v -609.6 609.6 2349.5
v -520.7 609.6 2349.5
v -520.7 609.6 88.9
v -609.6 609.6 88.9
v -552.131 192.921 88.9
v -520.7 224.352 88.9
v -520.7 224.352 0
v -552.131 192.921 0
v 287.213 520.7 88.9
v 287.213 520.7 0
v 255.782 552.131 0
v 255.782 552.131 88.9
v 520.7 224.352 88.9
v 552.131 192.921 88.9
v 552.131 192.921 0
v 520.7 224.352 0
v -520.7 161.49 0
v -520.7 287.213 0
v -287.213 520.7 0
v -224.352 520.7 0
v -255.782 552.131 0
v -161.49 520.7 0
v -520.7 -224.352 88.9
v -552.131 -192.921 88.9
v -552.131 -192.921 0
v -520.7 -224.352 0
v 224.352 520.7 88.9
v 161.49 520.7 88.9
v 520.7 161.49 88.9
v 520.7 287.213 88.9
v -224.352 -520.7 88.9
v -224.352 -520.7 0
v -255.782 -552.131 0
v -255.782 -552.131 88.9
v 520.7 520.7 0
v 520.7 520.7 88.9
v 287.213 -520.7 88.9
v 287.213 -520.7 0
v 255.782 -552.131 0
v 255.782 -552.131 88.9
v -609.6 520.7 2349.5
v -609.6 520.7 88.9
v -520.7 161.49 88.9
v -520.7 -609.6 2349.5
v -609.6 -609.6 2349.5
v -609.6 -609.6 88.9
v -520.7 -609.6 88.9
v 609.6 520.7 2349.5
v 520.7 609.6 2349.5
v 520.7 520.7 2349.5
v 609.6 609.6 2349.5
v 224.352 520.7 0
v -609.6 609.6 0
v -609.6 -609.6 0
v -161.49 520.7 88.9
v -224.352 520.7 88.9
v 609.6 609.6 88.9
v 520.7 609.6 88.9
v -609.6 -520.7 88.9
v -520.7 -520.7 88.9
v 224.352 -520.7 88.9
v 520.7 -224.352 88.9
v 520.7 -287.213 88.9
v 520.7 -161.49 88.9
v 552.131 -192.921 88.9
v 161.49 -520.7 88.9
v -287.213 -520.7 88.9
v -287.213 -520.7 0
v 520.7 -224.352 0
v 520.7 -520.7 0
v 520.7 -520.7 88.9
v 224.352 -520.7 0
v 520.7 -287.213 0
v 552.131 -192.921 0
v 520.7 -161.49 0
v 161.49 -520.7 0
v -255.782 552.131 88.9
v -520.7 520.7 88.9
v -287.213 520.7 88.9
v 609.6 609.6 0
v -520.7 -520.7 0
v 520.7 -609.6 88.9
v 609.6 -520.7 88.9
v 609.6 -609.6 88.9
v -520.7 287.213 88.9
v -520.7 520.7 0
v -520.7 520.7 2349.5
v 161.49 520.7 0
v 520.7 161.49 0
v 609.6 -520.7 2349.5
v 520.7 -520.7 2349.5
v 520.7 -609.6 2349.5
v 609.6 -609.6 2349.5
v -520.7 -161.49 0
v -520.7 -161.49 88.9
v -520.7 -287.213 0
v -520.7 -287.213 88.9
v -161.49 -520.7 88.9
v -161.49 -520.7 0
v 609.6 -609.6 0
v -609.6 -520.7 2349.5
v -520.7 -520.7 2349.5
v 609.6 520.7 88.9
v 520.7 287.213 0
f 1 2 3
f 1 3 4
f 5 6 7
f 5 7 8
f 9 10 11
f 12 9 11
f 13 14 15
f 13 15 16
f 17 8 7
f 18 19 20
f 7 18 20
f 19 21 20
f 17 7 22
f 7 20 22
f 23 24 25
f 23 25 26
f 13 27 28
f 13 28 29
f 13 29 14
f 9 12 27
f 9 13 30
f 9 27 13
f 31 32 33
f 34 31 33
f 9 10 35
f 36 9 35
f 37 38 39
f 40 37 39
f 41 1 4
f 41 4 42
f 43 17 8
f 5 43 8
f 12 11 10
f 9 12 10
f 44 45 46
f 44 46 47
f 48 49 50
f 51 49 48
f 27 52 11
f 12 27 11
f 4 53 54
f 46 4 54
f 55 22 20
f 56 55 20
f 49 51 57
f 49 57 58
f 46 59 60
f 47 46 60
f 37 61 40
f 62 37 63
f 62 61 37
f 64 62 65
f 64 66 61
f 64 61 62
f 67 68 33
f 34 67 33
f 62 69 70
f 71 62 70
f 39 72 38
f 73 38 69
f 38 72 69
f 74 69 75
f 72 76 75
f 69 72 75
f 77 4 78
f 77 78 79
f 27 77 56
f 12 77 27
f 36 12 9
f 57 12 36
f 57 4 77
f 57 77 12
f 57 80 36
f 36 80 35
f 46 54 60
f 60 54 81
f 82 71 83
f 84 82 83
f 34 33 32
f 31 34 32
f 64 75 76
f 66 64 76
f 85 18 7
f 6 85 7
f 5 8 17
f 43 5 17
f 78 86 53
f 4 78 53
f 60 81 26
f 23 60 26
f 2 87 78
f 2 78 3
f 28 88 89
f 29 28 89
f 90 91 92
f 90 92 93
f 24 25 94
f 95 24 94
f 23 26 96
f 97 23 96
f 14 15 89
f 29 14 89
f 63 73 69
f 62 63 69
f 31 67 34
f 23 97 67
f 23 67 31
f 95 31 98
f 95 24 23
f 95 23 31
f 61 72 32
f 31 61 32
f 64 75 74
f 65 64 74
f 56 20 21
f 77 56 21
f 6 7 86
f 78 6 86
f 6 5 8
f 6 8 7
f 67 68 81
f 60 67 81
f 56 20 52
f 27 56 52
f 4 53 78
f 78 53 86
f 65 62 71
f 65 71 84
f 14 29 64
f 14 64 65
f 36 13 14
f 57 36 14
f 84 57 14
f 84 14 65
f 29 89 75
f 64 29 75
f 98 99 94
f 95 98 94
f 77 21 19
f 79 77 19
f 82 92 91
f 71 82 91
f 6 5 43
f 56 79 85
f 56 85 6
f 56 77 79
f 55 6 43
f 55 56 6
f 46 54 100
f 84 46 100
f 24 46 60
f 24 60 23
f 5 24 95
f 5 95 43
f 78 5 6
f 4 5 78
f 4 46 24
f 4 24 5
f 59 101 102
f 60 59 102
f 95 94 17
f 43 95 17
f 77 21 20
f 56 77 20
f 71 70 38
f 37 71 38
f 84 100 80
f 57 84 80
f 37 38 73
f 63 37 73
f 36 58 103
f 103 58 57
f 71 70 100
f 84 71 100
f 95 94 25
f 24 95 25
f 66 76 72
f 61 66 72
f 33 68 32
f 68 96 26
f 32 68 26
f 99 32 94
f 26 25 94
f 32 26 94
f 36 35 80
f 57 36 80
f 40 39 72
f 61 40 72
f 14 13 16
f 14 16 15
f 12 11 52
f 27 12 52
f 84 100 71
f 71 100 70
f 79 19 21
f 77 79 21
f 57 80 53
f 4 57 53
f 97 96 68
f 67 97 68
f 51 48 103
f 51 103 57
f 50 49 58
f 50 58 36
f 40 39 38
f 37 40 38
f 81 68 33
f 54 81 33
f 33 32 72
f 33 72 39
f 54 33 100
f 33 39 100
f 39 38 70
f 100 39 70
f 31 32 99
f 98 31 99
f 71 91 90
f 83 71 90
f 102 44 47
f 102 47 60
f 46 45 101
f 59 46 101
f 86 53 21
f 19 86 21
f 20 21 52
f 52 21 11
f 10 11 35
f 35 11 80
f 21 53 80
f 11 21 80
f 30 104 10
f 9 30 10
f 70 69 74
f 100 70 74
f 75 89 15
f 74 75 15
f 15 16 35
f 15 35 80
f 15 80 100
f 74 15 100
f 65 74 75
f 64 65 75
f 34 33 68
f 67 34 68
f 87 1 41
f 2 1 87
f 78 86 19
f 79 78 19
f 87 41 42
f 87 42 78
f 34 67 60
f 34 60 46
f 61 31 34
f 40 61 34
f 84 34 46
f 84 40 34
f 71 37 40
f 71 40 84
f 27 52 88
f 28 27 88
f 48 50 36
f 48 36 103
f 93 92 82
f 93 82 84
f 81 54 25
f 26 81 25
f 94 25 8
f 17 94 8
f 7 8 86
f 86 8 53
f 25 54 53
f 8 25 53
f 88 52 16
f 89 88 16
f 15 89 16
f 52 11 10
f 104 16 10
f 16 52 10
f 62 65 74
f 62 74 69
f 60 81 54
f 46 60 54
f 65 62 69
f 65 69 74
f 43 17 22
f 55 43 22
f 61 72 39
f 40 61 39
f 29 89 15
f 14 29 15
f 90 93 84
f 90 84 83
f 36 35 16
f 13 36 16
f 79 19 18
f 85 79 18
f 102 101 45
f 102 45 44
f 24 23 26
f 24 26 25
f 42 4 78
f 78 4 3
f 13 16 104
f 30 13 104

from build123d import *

# Parameters (mm, degrees)
F1_DEPTH  = 88.9
F2_DEPTH  = 88.9
F3_DEPTH  = 88.9
F4_DEPTH  = 88.9
F5_DEPTH  = 88.9
F6_DEPTH  = 88.9
F7_DEPTH  = 88.9
F8_DEPTH  = 88.9
F10_DEPTH = 2260.6
F11_DEPTH = 2260.6
F9_W      = 88.9
F9_H      = 88.9
F12_DEPTH = 2260.6
F13_DEPTH = 2260.6


with BuildPart() as f1:
    # F0 (on Top) → F1 (new body)
    with BuildSketch(Plane.XY):
        Polygon((520.7, 520.7), (609.6, 609.6), (-609.6, 609.6), (-520.7, 520.7), (-287.213341, 520.7), (-255.782444, 552.130896), (-224.351548, 520.7), (-161.489755, 520.7), (161.489755, 520.7), (224.351548, 520.7), (255.782444, 552.130896), (287.213341, 520.7), align=None)
    extrude(amount=F1_DEPTH)


with BuildPart() as f2:
    # F0 (on Top) → F2 (new body)
    with BuildSketch(Plane.XY):
        Polygon((-520.7, 520.7), (-609.6, 609.6), (-609.6, -609.6), (-520.7, -520.7), (-520.7, -287.213341), (-520.7, -224.351548), (-552.130896, -192.920652), (-520.7, -161.489755), (-520.7, 161.489755), (-552.130896, 192.920652), (-520.7, 224.351548), (-520.7, 287.213341), align=None)
    extrude(amount=F2_DEPTH)


with BuildPart() as f3:
    # F0 (on Top) → F3 (new body)
    with BuildSketch(Plane.XY):
        Polygon((-609.6, -609.6), (609.6, -609.6), (520.7, -520.7), (287.213341, -520.7), (255.782444, -552.130896), (224.351548, -520.7), (161.489755, -520.7), (-161.489755, -520.7), (-224.351548, -520.7), (-255.782444, -552.130896), (-287.213341, -520.7), (-520.7, -520.7), align=None)
    extrude(amount=F3_DEPTH)


with BuildPart() as f4:
    # F0 (on Top) → F4 (new body)
    with BuildSketch(Plane.XY):
        Polygon((609.6, -609.6), (609.6, 609.6), (520.7, 520.7), (520.7, 287.213341), (520.7, 224.351548), (552.130896, 192.920652), (520.7, 161.489755), (520.7, -161.489755), (552.130896, -192.920652), (520.7, -224.351548), (520.7, -287.213341), (520.7, -520.7), align=None)
    extrude(amount=F4_DEPTH)


with BuildPart() as f5:
    # F0 (on Top) → F5 (new body)
    with BuildSketch(Plane.XY):
        Polygon((-287.213341, 520.7), (-520.7, 287.213341), (-520.7, 224.351548), (-552.130896, 192.920652), (-520.7, 161.489755), (-161.489755, 520.7), (-224.351548, 520.7), (-255.782444, 552.130896), align=None)
    extrude(amount=F5_DEPTH)


with BuildPart() as f6:
    # F0 (on Top) → F6 (new body)
    with BuildSketch(Plane.XY):
        Polygon((520.7, 287.213341), (287.213341, 520.7), (255.782444, 552.130896), (224.351548, 520.7), (161.489755, 520.7), (520.7, 161.489755), (552.130896, 192.920652), (520.7, 224.351548), align=None)
    extrude(amount=F6_DEPTH)


with BuildPart() as f7:
    # F0 (on Top) → F7 (new body)
    with BuildSketch(Plane.XY):
        Polygon((-520.7, -287.213341), (-287.213341, -520.7), (-255.782444, -552.130896), (-224.351548, -520.7), (-161.489755, -520.7), (-520.7, -161.489755), (-552.130896, -192.920652), (-520.7, -224.351548), align=None)
    extrude(amount=F7_DEPTH)


with BuildPart() as f8:
    # F0 (on Top) → F8 (new body)
    with BuildSketch(Plane.XY):
        Polygon((255.782444, -552.130896), (287.213341, -520.7), (520.7, -287.213341), (520.7, -224.351548), (552.130896, -192.920652), (520.7, -161.489755), (161.489755, -520.7), (224.351548, -520.7), align=None)
    extrude(amount=F8_DEPTH)


with BuildPart() as f10:
    # F9 (on face) → F10 (new body)
    with BuildSketch(Plane.XY.offset(88.9)):
        Polygon((-520.7, 609.6), (-609.6, 609.6), (-520.7, 520.7), align=None)
        Polygon((-520.7, 520.7), (-609.6, 609.6), (-609.6, 520.7), align=None)
    extrude(amount=F10_DEPTH)


with BuildPart() as f11:
    # F9 (on face) → F11 (new body)
    with BuildSketch(Plane.XY.offset(88.9)):
        Polygon((609.6, 609.6), (520.7, 609.6), (520.7, 520.7), align=None)
        Polygon((609.6, 520.7), (609.6, 609.6), (520.7, 520.7), align=None)
    extrude(amount=F11_DEPTH)


with BuildPart() as f12:
    # F9 (on face) → F12 (new body)
    with BuildSketch(Plane.XY.offset(88.9)):
        with Locations((-565.15, -565.15)):
            Rectangle(F9_W, F9_H)
    extrude(amount=F12_DEPTH)


with BuildPart() as f13:
    # F9 (on face) → F13 (new body)
    with BuildSketch(Plane.XY.offset(88.9)):
        with Locations((565.15, -565.15)):
            Rectangle(F9_W, F9_H)
    extrude(amount=F13_DEPTH)


solid = Compound([f1.part, f2.part, f3.part, f4.part, f5.part, f6.part, f7.part, f8.part, f10.part, f11.part, f12.part, f13.part])
